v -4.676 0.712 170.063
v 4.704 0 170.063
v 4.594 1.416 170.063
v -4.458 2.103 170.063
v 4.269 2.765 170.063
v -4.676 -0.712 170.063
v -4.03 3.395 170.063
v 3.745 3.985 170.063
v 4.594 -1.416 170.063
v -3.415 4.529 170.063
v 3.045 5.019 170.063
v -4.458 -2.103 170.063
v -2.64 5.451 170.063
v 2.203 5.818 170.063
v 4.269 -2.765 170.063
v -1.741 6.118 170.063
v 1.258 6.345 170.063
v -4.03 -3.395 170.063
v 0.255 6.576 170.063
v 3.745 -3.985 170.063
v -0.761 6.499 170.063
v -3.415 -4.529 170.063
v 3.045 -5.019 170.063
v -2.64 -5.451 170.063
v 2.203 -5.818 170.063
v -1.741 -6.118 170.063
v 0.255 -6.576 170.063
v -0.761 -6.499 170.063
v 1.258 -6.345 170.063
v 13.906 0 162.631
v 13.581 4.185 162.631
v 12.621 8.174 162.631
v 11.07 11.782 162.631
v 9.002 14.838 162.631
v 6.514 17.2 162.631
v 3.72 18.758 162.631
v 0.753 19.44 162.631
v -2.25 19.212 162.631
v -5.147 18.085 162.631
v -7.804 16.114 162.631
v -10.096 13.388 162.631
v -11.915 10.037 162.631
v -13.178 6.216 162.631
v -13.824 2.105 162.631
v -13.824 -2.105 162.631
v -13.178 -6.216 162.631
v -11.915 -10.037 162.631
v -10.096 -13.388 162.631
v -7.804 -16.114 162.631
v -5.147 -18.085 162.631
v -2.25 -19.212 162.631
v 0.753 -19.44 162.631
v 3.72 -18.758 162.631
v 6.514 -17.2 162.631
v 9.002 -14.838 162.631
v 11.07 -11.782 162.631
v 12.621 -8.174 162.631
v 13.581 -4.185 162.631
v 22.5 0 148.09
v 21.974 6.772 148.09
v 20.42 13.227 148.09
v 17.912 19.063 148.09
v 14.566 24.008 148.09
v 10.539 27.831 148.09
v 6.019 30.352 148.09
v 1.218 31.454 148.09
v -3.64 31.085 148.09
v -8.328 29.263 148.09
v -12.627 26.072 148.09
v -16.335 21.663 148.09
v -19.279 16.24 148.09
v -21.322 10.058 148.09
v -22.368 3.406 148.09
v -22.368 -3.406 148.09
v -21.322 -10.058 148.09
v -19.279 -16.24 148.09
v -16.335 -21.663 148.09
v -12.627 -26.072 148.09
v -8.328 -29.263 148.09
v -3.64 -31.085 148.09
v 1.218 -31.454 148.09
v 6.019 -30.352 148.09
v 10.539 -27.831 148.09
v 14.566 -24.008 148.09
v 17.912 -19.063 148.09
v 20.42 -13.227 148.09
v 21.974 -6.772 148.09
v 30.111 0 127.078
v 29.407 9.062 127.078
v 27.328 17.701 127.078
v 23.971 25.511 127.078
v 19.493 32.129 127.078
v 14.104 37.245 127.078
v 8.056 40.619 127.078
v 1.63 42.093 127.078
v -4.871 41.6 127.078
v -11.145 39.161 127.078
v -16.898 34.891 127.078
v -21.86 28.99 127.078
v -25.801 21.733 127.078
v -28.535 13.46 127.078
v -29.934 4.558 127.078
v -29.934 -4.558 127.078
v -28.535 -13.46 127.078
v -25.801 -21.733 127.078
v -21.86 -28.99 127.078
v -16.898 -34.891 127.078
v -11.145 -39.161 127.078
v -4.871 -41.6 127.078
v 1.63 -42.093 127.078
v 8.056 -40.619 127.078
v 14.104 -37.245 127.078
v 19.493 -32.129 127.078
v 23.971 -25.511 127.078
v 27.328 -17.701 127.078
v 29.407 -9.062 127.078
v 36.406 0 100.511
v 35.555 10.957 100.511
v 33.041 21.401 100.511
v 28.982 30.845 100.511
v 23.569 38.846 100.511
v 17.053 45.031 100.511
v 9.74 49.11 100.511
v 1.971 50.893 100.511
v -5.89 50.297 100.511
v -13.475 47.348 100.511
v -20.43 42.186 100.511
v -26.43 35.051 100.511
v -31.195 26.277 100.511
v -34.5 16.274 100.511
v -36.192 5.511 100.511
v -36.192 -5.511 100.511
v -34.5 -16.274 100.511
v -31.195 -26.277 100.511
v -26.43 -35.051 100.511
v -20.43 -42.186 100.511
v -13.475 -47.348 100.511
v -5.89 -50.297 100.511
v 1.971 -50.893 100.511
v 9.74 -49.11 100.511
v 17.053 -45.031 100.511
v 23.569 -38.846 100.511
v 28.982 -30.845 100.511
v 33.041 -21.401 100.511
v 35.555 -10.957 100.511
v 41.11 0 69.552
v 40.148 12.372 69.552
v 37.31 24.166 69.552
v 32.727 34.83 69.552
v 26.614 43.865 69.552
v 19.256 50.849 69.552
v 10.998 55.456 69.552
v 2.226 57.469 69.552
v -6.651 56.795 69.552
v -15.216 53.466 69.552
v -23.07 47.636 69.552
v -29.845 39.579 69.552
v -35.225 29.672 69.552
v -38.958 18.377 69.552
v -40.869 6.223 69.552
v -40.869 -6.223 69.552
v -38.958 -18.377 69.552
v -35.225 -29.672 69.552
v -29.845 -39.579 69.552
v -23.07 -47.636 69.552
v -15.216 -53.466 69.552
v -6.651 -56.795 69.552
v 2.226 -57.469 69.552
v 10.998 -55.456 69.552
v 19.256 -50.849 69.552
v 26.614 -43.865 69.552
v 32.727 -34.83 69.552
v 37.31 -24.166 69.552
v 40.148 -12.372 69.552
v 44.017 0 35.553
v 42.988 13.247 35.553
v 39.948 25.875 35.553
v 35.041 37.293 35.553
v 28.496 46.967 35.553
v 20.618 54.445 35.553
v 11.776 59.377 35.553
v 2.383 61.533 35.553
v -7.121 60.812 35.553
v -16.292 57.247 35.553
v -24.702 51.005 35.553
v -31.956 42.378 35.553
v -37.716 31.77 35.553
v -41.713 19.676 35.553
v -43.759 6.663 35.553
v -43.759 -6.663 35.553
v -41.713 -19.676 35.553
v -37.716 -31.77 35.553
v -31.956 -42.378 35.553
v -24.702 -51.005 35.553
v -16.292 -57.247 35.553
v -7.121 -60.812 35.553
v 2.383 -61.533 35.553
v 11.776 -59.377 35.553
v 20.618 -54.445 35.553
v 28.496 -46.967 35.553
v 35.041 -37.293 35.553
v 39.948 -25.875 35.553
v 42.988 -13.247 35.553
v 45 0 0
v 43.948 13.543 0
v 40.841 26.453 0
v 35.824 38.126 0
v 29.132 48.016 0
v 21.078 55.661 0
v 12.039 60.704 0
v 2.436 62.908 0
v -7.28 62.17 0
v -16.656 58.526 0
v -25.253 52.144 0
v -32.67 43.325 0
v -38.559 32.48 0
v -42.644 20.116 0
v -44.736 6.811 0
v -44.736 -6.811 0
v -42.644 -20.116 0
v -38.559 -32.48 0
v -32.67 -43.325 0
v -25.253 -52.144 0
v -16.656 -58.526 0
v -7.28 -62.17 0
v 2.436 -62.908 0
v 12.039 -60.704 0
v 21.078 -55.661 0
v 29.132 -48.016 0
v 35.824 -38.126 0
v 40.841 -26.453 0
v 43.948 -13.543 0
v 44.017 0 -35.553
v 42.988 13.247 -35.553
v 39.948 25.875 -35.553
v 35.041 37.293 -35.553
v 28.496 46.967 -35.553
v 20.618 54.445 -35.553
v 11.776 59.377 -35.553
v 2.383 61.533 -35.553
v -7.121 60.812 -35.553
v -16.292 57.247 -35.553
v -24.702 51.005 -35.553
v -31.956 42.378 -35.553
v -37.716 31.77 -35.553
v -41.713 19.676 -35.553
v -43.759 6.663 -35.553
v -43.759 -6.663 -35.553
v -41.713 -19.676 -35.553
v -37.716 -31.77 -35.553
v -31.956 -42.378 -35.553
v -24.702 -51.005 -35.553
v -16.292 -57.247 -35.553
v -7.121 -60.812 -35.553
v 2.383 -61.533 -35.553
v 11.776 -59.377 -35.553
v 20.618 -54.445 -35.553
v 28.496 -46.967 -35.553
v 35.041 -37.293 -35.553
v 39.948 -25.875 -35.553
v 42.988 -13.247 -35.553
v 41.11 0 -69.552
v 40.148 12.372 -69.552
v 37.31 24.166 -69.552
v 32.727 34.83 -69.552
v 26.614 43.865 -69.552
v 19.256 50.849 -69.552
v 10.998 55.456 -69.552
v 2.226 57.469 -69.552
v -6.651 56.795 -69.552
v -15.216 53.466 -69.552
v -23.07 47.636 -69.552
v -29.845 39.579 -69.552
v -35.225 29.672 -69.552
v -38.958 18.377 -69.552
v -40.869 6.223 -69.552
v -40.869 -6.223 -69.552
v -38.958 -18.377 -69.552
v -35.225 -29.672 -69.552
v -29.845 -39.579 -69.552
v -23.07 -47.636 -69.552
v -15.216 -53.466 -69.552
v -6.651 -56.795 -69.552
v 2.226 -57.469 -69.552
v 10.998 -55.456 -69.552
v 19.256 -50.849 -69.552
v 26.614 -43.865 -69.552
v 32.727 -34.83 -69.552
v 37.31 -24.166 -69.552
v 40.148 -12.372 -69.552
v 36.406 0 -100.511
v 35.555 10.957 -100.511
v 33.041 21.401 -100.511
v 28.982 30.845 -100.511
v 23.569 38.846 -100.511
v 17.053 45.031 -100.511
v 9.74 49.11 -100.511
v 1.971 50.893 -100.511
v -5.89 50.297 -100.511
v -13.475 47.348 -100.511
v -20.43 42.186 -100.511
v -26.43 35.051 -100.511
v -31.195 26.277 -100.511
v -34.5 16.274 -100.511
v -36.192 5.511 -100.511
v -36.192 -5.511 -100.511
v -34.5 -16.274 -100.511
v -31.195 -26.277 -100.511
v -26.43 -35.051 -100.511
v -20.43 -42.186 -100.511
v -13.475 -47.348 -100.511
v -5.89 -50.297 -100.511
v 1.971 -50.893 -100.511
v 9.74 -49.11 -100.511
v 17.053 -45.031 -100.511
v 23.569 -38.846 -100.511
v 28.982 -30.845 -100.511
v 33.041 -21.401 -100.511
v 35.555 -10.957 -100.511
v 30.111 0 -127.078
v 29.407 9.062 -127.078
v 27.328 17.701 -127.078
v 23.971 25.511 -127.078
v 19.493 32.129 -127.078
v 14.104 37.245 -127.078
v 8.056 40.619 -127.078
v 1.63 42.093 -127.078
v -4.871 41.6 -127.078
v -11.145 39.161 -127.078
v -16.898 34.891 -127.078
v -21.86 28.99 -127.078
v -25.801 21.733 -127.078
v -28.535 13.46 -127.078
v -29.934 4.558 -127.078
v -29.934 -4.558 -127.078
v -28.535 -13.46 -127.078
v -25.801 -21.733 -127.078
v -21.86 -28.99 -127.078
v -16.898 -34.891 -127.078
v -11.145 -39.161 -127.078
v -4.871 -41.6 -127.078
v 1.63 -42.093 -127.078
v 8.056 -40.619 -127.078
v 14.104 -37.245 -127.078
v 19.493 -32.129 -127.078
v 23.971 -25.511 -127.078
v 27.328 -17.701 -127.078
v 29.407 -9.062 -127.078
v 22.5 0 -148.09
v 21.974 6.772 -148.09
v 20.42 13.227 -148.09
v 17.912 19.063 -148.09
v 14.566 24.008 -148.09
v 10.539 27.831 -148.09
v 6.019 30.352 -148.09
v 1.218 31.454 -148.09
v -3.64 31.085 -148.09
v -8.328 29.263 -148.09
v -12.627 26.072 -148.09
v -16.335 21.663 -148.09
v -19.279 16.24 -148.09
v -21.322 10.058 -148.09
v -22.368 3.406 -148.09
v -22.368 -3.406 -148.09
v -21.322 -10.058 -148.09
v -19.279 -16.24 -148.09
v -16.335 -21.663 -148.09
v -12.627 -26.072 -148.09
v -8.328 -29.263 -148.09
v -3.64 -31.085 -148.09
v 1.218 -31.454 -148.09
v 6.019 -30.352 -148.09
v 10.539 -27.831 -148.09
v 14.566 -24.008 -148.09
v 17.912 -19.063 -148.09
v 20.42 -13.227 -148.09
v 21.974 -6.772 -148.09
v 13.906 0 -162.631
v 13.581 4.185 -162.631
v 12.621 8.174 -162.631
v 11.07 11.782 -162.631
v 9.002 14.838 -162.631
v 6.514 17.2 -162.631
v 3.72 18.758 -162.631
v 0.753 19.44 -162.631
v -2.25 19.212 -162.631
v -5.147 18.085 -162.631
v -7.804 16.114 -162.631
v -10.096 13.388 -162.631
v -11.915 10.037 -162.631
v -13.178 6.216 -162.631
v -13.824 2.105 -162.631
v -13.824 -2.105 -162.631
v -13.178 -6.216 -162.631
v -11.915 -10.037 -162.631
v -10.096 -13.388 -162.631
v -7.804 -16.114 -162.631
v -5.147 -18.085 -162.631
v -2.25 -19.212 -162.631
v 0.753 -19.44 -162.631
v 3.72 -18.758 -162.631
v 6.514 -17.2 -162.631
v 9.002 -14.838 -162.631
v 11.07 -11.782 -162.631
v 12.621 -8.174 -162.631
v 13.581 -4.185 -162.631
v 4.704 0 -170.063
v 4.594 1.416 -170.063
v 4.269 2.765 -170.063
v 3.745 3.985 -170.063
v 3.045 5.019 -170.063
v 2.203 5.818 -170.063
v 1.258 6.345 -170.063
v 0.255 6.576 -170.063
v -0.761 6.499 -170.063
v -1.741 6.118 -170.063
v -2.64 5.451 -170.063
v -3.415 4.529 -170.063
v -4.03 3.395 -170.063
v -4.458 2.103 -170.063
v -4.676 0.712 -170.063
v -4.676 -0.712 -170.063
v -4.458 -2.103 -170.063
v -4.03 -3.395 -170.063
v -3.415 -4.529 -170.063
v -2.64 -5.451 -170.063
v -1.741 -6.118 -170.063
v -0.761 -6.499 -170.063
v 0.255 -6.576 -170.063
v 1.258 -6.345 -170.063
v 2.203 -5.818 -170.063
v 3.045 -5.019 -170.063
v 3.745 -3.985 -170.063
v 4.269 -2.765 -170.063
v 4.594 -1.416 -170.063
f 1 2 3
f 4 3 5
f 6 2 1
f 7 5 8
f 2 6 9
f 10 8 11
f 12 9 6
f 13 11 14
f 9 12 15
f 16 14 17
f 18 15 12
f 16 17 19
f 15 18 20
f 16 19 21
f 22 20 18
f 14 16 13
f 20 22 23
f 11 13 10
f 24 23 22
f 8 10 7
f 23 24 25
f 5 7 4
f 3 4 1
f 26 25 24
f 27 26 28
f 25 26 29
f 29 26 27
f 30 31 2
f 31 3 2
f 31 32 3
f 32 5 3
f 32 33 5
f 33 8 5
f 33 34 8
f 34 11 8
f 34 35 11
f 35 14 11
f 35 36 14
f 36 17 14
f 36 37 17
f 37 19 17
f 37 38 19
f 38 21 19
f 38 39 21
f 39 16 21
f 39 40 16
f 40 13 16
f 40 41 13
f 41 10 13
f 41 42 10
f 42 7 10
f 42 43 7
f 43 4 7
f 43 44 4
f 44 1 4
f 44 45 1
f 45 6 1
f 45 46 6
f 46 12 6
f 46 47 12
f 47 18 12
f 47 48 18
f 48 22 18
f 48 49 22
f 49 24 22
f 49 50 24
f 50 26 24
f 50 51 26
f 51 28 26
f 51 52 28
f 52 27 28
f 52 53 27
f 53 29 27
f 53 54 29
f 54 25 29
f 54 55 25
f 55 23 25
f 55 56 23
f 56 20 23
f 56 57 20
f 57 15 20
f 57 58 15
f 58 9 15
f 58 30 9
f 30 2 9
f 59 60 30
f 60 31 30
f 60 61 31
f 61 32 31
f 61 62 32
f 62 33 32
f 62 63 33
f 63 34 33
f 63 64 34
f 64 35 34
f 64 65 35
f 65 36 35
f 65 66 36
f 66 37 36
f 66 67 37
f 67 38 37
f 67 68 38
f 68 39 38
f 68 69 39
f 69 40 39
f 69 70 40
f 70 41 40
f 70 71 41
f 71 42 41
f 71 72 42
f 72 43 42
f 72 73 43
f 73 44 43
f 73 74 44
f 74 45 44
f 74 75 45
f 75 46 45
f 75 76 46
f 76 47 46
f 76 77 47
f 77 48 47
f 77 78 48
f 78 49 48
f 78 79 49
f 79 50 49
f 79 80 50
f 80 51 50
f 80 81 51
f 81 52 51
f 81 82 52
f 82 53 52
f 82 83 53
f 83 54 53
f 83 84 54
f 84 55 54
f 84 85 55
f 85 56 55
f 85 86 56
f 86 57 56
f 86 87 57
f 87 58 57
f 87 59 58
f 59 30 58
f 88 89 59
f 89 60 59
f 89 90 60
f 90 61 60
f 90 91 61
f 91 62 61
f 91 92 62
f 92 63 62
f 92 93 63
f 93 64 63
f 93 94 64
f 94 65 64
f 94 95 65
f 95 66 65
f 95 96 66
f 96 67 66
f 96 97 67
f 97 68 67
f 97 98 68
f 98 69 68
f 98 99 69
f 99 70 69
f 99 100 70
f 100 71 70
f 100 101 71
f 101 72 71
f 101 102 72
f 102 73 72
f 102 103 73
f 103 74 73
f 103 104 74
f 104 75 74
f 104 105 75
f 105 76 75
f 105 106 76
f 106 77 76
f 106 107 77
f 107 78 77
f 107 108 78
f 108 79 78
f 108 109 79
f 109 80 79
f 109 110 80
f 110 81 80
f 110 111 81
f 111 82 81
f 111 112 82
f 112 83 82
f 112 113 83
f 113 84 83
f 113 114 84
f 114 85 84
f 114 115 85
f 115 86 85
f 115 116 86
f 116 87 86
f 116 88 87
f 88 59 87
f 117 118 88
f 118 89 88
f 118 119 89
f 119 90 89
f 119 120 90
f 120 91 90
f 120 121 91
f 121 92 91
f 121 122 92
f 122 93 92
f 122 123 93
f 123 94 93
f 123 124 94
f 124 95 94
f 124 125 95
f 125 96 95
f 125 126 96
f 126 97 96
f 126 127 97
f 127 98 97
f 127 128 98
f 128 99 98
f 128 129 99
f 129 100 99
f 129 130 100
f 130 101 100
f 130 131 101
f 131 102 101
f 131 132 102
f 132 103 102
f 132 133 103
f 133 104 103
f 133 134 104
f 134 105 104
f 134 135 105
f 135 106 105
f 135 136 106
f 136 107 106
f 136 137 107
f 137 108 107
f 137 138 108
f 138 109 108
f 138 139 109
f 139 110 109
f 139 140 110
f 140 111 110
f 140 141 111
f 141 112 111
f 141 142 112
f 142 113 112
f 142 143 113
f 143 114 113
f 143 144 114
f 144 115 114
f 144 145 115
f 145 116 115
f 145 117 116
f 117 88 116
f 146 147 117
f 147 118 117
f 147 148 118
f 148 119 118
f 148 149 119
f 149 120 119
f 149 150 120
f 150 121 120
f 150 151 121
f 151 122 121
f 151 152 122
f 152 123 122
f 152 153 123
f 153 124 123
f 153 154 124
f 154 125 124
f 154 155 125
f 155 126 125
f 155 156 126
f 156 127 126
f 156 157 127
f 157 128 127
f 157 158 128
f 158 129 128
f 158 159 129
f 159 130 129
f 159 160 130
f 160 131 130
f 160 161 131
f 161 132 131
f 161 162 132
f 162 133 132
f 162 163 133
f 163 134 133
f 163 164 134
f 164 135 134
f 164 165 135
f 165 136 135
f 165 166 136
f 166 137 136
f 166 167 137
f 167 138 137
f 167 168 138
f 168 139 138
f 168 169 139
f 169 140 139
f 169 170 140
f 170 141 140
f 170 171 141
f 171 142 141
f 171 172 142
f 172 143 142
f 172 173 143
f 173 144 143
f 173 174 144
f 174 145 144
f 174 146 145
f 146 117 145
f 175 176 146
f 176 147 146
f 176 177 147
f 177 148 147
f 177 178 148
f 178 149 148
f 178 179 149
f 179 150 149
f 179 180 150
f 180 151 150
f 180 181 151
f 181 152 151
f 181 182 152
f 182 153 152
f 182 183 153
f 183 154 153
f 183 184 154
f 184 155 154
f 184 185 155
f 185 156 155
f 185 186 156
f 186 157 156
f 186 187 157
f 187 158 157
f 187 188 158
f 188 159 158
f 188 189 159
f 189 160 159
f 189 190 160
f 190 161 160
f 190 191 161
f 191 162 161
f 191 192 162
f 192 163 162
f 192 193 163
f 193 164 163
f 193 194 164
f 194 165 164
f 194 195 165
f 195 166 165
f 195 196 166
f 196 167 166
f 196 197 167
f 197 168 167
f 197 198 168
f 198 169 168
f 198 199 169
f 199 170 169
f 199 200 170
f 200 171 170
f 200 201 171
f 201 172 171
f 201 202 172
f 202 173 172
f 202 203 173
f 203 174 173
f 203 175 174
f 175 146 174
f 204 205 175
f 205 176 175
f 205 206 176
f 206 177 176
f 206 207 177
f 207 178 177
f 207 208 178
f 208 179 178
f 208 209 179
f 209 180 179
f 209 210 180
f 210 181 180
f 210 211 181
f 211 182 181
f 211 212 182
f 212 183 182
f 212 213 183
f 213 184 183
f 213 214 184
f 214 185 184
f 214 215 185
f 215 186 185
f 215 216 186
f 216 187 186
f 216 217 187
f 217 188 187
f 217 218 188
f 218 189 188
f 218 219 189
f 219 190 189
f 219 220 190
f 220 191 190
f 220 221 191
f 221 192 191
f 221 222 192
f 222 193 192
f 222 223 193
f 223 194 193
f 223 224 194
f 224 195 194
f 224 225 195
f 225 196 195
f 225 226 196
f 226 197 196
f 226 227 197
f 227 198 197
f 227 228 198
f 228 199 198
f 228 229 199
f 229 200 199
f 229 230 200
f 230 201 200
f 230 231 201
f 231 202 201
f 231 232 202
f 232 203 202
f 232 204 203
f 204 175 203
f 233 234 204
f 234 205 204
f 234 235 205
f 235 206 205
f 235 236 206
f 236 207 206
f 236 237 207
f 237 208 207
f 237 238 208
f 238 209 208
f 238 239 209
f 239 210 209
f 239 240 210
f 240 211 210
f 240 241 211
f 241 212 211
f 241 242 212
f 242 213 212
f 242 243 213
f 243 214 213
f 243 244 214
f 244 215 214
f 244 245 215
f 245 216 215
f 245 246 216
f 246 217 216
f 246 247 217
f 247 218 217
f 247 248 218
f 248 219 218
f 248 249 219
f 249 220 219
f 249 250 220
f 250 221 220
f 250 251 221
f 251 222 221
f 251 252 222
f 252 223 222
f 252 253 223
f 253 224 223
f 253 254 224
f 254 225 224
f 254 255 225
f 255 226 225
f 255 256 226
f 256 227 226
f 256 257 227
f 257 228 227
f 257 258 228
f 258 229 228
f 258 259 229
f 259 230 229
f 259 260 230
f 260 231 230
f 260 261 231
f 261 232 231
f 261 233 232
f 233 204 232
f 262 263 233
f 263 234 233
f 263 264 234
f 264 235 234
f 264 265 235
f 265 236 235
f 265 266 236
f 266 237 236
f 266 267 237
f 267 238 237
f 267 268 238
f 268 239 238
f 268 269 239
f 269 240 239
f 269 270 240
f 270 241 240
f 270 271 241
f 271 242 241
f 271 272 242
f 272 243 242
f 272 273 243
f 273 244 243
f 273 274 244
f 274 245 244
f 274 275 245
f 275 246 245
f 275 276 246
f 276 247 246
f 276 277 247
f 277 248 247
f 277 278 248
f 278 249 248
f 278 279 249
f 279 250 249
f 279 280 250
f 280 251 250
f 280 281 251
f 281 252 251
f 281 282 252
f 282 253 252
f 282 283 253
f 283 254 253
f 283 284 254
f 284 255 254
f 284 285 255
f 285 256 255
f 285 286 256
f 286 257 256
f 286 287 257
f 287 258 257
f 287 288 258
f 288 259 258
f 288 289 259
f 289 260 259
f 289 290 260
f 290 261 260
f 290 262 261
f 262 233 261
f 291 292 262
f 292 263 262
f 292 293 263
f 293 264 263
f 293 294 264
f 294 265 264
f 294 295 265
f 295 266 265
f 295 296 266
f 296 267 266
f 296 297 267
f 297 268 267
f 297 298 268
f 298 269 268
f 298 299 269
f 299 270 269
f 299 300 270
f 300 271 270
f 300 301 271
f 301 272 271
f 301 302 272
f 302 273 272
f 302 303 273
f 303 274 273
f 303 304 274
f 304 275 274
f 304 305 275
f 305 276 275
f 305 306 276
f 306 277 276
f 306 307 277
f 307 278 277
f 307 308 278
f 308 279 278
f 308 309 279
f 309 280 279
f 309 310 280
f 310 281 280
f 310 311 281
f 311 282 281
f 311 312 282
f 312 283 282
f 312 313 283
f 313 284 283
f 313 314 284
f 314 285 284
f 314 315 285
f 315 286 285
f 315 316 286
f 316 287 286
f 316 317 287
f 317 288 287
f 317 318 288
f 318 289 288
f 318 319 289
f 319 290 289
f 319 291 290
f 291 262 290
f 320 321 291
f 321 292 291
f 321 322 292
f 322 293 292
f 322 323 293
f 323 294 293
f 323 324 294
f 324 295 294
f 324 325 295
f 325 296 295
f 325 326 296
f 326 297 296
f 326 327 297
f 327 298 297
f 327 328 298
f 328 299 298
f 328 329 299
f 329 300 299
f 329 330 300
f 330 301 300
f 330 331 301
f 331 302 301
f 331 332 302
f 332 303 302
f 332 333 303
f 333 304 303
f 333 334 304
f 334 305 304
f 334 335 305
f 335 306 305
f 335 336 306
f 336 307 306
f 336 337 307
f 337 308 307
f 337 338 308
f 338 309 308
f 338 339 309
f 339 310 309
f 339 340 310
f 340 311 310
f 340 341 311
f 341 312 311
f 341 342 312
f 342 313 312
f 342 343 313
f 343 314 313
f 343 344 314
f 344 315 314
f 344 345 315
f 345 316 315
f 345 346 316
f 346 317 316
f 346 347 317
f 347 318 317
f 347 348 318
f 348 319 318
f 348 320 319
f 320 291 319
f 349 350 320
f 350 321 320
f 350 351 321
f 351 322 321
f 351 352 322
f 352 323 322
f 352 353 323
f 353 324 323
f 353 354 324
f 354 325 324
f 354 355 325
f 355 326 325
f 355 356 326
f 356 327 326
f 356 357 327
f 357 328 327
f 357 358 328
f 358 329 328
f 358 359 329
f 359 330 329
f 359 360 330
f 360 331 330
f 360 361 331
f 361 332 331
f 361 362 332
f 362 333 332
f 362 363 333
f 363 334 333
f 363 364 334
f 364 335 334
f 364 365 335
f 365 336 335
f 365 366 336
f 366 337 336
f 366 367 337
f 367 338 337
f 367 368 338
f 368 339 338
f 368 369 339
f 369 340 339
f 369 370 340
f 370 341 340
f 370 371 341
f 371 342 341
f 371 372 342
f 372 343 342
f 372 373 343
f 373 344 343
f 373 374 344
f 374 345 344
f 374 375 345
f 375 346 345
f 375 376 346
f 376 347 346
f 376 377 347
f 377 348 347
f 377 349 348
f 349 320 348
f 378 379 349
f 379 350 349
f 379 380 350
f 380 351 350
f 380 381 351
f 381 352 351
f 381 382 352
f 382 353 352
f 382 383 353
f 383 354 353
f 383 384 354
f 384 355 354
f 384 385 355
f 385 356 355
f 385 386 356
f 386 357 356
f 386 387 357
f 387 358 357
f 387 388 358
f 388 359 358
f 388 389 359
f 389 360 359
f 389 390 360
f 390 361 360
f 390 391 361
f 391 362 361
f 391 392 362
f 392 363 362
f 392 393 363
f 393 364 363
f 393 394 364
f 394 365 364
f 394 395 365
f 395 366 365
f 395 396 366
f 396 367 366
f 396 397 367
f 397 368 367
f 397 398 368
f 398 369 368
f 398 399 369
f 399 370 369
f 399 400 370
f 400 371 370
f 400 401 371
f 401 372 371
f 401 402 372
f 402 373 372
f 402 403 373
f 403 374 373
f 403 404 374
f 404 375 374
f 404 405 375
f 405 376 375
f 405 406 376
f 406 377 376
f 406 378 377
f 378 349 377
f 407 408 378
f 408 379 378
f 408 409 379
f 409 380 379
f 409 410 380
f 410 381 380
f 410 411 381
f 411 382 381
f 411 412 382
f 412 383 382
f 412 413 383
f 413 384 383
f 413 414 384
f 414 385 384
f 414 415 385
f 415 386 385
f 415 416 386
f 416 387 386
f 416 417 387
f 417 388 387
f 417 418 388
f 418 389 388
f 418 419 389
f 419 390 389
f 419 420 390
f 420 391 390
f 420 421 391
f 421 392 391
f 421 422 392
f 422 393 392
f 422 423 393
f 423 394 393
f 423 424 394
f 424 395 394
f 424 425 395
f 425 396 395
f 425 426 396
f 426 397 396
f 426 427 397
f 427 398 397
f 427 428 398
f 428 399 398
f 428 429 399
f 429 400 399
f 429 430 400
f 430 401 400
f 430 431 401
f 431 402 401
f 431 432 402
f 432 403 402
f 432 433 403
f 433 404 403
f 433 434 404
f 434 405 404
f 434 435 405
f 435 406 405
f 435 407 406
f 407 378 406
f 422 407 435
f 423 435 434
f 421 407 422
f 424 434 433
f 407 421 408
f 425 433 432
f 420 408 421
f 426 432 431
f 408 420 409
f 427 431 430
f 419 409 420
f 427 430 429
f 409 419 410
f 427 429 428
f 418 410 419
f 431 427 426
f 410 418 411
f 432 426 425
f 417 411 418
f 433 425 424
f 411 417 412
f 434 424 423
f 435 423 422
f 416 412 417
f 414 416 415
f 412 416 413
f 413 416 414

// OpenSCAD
// Generated by SolidPython 1.0.1 on 2020-07-29 00:46:46


scale(v = [5, 7, 19]) {
	sphere(r = 9);
}
/***********************************************
*********      SolidPython code:      **********
************************************************
 
# import packages: SolidPython
from solid import *
from solid.utils import *
from itertools import chain, combinations, permutations


class Resize:

    def __init__(self, scad_file):
        self.scad_file = scad_file
        #self.scad_file = import_scad(scad_file)
        # cone/cylinder param:
        self.r1 = 0
        self.r2 = 0
        self.h = 0
        # rectangular prism param:
        self.w = 0
        self.l = 0
        # ellipse param:
        self.r = 0

    # import OpenScad code (file name corresponds to shape)


    # classify shape + parameters
    def assign(self, param1, param2, param3):
        if self.scad_file == 'cone.scad':
            self.r1 = param1
            self.r2 = param2
            self.h = param3
        elif self.scad_file == 'cylinder.scad':
            self.r1 = param1
            self.r2 = param2
            self.h = param3
        elif self.scad_file == 'rectangularPrism.scad':
            self.h = param1
            self.l = param2
            self.w = param3
        else:
            self.r = param1
            self.h = param2

    # resize parameters
    def iterate(self):
        x = range(3, 20, 2)
        i = 1
        if self.scad_file == 'cone.scad':
            tempList = list(permutations(x, 2))
            for temp in tempList:
                param1 = temp[0]
                param2 = temp[1]
                filepath = 'produced_scad_files/' + 'cone' + str(param1) + '_' + str(param2) + '_' + '.scad'
                scad_render_to_file(cylinder(h=param1, r1=param2, r2=0), filepath)

        elif self.scad_file == 'cylinder.scad':
            tempList = list(permutations(x, 3))
            for temp in tempList:
                param1 = temp[0]
                param2 = temp[1]
                filepath = 'produced_scad_files/' + 'cylinder' + str(param1) + '_' + str(param2) + '_' + '.scad'
                scad_render_to_file(cylinder(h=param1, r1=param2, r2=param2), filepath)

        elif self.scad_file == 'rectangularPrism.scad':
            tempList = list(permutations(x, 3))
            for temp in tempList:
                param1 = temp[0]
                param2 = temp[1]
                param3 = temp[2]
                filepath = 'produced_scad_files/' + 'rectangularPrism' + str(param1) + '_' + str(param2) + '_' + str(
                    param3) + '.scad'
                scad_render_to_file(cube(size=(param1, param2, param3)), filepath)

        elif self.scad_file == 'ellipse.scad':
            tempList = list(permutations(x, 4))
            for temp in tempList:
                param1 = temp[0]
                param2 = temp[1]
                param3 = temp[2]
                param4 = temp[3]
                filepath = 'produced_scad_files/' + 'ellipse' + str(param1) + '_' + str(param2) + '_' + str(param3) + '_' + str(param4) + '.scad'
                scad_render_to_file(scale([param1, param2, param3])(sphere(r=param4)), filepath)

    def render_to_scadfile(self):
        scad_render_to_file(scad, 'example.scad') 
 
************************************************/
